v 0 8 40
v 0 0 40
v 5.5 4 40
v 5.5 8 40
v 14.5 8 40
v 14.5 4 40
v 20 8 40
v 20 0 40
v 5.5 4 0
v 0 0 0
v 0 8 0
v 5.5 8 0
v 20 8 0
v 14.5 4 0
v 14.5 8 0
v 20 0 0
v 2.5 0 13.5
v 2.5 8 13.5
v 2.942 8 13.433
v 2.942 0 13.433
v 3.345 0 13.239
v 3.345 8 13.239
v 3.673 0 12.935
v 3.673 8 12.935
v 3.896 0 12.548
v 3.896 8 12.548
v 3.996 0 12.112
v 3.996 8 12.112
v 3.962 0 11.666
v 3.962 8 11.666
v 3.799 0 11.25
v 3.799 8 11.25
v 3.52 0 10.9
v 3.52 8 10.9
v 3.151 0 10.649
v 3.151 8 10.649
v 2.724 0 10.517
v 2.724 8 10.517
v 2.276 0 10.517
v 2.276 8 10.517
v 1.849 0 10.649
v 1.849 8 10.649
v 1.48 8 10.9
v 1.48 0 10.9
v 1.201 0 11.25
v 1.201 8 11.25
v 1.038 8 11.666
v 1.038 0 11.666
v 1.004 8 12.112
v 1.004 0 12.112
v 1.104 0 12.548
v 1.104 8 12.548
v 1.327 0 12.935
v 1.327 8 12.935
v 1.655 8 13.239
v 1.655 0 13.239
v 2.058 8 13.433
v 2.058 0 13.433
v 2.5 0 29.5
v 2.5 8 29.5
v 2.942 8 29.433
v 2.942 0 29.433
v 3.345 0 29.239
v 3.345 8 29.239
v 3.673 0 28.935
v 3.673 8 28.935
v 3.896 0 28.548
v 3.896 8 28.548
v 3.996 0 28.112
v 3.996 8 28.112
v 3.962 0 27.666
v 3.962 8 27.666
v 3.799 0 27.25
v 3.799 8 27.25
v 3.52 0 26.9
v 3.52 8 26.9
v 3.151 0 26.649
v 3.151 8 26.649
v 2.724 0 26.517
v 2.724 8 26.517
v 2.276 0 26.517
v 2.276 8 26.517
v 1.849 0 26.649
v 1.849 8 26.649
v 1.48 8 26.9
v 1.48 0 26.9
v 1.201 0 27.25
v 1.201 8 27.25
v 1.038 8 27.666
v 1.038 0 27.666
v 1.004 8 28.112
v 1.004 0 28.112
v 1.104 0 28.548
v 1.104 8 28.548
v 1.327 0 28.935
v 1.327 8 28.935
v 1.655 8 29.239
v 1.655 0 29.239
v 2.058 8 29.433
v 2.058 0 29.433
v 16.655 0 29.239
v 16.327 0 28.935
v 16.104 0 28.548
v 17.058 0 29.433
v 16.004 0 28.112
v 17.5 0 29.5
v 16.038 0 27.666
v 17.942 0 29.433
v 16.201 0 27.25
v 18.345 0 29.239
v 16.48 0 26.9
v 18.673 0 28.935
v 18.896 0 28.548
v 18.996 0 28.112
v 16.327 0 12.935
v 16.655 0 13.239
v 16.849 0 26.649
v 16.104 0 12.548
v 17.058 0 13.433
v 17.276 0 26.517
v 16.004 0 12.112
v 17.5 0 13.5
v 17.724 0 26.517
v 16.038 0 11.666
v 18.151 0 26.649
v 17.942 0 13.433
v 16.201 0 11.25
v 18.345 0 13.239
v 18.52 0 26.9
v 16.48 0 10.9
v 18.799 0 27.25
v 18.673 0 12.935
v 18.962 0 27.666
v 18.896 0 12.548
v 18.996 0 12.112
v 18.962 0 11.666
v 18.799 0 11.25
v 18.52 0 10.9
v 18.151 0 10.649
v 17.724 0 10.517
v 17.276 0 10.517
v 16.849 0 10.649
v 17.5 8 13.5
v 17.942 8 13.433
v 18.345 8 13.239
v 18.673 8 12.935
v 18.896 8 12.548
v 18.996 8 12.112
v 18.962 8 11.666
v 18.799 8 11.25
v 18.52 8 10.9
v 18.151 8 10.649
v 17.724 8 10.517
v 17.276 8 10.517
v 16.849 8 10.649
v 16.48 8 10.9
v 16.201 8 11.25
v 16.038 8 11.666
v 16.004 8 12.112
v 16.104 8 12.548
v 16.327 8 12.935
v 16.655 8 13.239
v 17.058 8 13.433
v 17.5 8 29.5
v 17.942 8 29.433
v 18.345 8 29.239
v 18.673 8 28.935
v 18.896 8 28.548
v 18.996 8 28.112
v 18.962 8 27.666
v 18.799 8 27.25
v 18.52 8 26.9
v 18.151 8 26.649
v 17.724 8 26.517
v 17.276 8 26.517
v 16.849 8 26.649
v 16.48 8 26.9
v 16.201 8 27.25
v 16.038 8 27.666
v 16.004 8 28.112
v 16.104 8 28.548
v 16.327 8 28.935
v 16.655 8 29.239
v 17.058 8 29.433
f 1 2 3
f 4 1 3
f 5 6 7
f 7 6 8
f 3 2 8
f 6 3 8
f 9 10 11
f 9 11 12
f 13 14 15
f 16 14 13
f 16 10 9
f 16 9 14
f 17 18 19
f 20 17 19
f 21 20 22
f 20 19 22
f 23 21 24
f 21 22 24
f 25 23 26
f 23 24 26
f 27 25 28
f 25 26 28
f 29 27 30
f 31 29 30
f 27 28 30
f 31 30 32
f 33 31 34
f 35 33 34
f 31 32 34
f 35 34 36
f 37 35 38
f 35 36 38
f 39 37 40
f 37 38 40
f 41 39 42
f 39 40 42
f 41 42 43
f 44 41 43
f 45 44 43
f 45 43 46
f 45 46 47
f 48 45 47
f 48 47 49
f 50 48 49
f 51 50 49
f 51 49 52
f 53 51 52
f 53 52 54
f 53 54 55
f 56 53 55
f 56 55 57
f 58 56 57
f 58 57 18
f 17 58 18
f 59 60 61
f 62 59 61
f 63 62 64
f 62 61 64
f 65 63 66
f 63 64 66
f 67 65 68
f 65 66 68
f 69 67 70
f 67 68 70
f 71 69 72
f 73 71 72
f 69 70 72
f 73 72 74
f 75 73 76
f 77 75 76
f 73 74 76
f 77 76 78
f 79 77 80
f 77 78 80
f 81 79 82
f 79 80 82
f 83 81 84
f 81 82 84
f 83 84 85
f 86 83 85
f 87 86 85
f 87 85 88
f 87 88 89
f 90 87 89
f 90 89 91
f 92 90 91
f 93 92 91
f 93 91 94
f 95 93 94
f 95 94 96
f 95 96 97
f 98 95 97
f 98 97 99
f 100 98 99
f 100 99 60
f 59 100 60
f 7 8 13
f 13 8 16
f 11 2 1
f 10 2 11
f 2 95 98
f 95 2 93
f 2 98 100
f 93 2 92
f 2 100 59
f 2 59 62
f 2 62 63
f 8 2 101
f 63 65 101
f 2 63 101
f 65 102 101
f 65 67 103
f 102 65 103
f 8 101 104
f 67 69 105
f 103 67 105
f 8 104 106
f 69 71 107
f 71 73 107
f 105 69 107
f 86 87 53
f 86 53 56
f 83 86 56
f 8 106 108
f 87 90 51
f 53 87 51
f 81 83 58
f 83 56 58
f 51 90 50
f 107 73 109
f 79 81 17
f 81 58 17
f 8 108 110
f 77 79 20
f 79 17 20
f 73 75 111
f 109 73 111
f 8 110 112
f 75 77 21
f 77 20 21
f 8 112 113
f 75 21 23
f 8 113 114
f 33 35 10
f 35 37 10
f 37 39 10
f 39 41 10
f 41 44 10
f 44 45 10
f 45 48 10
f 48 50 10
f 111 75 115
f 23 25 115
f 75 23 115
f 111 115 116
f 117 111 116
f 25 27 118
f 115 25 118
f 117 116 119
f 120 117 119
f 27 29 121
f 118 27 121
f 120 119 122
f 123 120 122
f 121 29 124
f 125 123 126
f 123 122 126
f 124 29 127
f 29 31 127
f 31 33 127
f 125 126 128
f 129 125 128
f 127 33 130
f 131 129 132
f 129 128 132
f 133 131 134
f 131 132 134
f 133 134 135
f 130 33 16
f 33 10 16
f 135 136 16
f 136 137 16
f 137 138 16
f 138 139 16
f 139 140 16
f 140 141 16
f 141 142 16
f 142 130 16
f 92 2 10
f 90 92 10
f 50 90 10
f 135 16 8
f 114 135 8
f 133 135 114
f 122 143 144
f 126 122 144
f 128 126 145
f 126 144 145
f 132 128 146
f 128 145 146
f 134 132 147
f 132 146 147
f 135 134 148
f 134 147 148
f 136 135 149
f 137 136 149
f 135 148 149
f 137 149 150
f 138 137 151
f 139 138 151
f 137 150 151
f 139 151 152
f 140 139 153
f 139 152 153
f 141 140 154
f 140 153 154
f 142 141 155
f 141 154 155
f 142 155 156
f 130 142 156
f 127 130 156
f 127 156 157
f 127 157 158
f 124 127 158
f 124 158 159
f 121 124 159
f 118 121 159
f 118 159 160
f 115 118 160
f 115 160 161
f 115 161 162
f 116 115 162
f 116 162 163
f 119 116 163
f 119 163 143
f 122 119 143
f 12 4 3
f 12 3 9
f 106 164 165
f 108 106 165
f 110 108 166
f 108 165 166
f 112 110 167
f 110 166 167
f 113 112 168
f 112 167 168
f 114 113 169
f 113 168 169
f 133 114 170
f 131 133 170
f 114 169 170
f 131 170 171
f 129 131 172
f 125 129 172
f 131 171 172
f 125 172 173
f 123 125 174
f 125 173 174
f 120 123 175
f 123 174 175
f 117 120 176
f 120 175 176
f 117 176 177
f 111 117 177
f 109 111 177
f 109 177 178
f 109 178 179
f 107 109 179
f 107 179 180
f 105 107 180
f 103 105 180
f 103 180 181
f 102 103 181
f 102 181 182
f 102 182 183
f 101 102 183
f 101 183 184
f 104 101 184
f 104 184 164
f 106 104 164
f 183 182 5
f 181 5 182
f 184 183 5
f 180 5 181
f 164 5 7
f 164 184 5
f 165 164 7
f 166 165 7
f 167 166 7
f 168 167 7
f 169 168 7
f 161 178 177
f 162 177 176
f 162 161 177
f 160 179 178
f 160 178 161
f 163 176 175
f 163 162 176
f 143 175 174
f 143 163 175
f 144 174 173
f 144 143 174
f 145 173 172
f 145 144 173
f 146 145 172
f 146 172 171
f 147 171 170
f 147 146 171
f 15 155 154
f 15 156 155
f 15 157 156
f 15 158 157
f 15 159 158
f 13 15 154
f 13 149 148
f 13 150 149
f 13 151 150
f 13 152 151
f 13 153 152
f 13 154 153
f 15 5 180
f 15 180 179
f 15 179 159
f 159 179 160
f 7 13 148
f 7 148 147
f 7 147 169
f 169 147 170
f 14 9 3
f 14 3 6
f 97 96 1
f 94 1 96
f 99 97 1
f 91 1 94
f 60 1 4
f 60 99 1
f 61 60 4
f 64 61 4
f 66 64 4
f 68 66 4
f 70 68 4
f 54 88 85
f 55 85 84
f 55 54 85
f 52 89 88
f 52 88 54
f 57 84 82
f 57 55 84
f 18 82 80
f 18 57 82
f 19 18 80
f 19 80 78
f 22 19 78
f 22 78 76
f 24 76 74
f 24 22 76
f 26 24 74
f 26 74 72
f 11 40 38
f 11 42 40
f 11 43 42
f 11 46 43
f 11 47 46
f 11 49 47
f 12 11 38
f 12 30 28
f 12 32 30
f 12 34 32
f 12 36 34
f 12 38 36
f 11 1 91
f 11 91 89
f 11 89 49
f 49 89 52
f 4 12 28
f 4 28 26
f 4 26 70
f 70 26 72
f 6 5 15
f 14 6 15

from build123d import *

# Parameters (mm, degrees)
SKETCH_1_W          = 20
SKETCH_1_H          = 40
EXTRUDE_1_DEPTH     = 8
SKETCH_2_R          = 1.5
CUT_EXTRUDE_1_DEPTH = 46.431266766
SKETCH_3_W          = 9
SKETCH_3_H          = 40
CUT_EXTRUDE_2_DEPTH = 4


with BuildPart() as part:
    # 草图1 → 凸台-拉伸1 (new body)
    with BuildSketch(Plane(origin=(0, 0, 0), x_dir=(1, 0, 0), z_dir=(0, 1, 0))):
        with Locations((10, -20)):
            Rectangle(SKETCH_1_W, SKETCH_1_H)
    extrude(amount=EXTRUDE_1_DEPTH)

    # 草图2 → 切除-拉伸1 (cut, through all)
    with BuildSketch(Plane(origin=(0, 8, 0), x_dir=(1, 0, 0), z_dir=(0, 1, 0))):
        with Locations(Location((2.5, -28, 0), (0, 0, 270))):
            Circle(SKETCH_2_R)
        with Locations(Location((17.5, -28, 0), (0, 0, 270))):
            Circle(SKETCH_2_R)
        with Locations(Location((17.5, -12, 0), (0, 0, 270))):
            Circle(SKETCH_2_R)
        with Locations(Location((2.5, -12, 0), (0, 0, 270))):
            Circle(SKETCH_2_R)
    extrude(amount=-CUT_EXTRUDE_1_DEPTH, mode=Mode.SUBTRACT)

    # 草图3 → 切除-拉伸2 (cut)
    with BuildSketch(Plane(origin=(0, 8, 0), x_dir=(1, 0, 0), z_dir=(0, 1, 0))):
        with Locations((10, -20)):
            Rectangle(SKETCH_3_W, SKETCH_3_H)
    extrude(amount=-CUT_EXTRUDE_2_DEPTH, mode=Mode.SUBTRACT)


solid = part.part
